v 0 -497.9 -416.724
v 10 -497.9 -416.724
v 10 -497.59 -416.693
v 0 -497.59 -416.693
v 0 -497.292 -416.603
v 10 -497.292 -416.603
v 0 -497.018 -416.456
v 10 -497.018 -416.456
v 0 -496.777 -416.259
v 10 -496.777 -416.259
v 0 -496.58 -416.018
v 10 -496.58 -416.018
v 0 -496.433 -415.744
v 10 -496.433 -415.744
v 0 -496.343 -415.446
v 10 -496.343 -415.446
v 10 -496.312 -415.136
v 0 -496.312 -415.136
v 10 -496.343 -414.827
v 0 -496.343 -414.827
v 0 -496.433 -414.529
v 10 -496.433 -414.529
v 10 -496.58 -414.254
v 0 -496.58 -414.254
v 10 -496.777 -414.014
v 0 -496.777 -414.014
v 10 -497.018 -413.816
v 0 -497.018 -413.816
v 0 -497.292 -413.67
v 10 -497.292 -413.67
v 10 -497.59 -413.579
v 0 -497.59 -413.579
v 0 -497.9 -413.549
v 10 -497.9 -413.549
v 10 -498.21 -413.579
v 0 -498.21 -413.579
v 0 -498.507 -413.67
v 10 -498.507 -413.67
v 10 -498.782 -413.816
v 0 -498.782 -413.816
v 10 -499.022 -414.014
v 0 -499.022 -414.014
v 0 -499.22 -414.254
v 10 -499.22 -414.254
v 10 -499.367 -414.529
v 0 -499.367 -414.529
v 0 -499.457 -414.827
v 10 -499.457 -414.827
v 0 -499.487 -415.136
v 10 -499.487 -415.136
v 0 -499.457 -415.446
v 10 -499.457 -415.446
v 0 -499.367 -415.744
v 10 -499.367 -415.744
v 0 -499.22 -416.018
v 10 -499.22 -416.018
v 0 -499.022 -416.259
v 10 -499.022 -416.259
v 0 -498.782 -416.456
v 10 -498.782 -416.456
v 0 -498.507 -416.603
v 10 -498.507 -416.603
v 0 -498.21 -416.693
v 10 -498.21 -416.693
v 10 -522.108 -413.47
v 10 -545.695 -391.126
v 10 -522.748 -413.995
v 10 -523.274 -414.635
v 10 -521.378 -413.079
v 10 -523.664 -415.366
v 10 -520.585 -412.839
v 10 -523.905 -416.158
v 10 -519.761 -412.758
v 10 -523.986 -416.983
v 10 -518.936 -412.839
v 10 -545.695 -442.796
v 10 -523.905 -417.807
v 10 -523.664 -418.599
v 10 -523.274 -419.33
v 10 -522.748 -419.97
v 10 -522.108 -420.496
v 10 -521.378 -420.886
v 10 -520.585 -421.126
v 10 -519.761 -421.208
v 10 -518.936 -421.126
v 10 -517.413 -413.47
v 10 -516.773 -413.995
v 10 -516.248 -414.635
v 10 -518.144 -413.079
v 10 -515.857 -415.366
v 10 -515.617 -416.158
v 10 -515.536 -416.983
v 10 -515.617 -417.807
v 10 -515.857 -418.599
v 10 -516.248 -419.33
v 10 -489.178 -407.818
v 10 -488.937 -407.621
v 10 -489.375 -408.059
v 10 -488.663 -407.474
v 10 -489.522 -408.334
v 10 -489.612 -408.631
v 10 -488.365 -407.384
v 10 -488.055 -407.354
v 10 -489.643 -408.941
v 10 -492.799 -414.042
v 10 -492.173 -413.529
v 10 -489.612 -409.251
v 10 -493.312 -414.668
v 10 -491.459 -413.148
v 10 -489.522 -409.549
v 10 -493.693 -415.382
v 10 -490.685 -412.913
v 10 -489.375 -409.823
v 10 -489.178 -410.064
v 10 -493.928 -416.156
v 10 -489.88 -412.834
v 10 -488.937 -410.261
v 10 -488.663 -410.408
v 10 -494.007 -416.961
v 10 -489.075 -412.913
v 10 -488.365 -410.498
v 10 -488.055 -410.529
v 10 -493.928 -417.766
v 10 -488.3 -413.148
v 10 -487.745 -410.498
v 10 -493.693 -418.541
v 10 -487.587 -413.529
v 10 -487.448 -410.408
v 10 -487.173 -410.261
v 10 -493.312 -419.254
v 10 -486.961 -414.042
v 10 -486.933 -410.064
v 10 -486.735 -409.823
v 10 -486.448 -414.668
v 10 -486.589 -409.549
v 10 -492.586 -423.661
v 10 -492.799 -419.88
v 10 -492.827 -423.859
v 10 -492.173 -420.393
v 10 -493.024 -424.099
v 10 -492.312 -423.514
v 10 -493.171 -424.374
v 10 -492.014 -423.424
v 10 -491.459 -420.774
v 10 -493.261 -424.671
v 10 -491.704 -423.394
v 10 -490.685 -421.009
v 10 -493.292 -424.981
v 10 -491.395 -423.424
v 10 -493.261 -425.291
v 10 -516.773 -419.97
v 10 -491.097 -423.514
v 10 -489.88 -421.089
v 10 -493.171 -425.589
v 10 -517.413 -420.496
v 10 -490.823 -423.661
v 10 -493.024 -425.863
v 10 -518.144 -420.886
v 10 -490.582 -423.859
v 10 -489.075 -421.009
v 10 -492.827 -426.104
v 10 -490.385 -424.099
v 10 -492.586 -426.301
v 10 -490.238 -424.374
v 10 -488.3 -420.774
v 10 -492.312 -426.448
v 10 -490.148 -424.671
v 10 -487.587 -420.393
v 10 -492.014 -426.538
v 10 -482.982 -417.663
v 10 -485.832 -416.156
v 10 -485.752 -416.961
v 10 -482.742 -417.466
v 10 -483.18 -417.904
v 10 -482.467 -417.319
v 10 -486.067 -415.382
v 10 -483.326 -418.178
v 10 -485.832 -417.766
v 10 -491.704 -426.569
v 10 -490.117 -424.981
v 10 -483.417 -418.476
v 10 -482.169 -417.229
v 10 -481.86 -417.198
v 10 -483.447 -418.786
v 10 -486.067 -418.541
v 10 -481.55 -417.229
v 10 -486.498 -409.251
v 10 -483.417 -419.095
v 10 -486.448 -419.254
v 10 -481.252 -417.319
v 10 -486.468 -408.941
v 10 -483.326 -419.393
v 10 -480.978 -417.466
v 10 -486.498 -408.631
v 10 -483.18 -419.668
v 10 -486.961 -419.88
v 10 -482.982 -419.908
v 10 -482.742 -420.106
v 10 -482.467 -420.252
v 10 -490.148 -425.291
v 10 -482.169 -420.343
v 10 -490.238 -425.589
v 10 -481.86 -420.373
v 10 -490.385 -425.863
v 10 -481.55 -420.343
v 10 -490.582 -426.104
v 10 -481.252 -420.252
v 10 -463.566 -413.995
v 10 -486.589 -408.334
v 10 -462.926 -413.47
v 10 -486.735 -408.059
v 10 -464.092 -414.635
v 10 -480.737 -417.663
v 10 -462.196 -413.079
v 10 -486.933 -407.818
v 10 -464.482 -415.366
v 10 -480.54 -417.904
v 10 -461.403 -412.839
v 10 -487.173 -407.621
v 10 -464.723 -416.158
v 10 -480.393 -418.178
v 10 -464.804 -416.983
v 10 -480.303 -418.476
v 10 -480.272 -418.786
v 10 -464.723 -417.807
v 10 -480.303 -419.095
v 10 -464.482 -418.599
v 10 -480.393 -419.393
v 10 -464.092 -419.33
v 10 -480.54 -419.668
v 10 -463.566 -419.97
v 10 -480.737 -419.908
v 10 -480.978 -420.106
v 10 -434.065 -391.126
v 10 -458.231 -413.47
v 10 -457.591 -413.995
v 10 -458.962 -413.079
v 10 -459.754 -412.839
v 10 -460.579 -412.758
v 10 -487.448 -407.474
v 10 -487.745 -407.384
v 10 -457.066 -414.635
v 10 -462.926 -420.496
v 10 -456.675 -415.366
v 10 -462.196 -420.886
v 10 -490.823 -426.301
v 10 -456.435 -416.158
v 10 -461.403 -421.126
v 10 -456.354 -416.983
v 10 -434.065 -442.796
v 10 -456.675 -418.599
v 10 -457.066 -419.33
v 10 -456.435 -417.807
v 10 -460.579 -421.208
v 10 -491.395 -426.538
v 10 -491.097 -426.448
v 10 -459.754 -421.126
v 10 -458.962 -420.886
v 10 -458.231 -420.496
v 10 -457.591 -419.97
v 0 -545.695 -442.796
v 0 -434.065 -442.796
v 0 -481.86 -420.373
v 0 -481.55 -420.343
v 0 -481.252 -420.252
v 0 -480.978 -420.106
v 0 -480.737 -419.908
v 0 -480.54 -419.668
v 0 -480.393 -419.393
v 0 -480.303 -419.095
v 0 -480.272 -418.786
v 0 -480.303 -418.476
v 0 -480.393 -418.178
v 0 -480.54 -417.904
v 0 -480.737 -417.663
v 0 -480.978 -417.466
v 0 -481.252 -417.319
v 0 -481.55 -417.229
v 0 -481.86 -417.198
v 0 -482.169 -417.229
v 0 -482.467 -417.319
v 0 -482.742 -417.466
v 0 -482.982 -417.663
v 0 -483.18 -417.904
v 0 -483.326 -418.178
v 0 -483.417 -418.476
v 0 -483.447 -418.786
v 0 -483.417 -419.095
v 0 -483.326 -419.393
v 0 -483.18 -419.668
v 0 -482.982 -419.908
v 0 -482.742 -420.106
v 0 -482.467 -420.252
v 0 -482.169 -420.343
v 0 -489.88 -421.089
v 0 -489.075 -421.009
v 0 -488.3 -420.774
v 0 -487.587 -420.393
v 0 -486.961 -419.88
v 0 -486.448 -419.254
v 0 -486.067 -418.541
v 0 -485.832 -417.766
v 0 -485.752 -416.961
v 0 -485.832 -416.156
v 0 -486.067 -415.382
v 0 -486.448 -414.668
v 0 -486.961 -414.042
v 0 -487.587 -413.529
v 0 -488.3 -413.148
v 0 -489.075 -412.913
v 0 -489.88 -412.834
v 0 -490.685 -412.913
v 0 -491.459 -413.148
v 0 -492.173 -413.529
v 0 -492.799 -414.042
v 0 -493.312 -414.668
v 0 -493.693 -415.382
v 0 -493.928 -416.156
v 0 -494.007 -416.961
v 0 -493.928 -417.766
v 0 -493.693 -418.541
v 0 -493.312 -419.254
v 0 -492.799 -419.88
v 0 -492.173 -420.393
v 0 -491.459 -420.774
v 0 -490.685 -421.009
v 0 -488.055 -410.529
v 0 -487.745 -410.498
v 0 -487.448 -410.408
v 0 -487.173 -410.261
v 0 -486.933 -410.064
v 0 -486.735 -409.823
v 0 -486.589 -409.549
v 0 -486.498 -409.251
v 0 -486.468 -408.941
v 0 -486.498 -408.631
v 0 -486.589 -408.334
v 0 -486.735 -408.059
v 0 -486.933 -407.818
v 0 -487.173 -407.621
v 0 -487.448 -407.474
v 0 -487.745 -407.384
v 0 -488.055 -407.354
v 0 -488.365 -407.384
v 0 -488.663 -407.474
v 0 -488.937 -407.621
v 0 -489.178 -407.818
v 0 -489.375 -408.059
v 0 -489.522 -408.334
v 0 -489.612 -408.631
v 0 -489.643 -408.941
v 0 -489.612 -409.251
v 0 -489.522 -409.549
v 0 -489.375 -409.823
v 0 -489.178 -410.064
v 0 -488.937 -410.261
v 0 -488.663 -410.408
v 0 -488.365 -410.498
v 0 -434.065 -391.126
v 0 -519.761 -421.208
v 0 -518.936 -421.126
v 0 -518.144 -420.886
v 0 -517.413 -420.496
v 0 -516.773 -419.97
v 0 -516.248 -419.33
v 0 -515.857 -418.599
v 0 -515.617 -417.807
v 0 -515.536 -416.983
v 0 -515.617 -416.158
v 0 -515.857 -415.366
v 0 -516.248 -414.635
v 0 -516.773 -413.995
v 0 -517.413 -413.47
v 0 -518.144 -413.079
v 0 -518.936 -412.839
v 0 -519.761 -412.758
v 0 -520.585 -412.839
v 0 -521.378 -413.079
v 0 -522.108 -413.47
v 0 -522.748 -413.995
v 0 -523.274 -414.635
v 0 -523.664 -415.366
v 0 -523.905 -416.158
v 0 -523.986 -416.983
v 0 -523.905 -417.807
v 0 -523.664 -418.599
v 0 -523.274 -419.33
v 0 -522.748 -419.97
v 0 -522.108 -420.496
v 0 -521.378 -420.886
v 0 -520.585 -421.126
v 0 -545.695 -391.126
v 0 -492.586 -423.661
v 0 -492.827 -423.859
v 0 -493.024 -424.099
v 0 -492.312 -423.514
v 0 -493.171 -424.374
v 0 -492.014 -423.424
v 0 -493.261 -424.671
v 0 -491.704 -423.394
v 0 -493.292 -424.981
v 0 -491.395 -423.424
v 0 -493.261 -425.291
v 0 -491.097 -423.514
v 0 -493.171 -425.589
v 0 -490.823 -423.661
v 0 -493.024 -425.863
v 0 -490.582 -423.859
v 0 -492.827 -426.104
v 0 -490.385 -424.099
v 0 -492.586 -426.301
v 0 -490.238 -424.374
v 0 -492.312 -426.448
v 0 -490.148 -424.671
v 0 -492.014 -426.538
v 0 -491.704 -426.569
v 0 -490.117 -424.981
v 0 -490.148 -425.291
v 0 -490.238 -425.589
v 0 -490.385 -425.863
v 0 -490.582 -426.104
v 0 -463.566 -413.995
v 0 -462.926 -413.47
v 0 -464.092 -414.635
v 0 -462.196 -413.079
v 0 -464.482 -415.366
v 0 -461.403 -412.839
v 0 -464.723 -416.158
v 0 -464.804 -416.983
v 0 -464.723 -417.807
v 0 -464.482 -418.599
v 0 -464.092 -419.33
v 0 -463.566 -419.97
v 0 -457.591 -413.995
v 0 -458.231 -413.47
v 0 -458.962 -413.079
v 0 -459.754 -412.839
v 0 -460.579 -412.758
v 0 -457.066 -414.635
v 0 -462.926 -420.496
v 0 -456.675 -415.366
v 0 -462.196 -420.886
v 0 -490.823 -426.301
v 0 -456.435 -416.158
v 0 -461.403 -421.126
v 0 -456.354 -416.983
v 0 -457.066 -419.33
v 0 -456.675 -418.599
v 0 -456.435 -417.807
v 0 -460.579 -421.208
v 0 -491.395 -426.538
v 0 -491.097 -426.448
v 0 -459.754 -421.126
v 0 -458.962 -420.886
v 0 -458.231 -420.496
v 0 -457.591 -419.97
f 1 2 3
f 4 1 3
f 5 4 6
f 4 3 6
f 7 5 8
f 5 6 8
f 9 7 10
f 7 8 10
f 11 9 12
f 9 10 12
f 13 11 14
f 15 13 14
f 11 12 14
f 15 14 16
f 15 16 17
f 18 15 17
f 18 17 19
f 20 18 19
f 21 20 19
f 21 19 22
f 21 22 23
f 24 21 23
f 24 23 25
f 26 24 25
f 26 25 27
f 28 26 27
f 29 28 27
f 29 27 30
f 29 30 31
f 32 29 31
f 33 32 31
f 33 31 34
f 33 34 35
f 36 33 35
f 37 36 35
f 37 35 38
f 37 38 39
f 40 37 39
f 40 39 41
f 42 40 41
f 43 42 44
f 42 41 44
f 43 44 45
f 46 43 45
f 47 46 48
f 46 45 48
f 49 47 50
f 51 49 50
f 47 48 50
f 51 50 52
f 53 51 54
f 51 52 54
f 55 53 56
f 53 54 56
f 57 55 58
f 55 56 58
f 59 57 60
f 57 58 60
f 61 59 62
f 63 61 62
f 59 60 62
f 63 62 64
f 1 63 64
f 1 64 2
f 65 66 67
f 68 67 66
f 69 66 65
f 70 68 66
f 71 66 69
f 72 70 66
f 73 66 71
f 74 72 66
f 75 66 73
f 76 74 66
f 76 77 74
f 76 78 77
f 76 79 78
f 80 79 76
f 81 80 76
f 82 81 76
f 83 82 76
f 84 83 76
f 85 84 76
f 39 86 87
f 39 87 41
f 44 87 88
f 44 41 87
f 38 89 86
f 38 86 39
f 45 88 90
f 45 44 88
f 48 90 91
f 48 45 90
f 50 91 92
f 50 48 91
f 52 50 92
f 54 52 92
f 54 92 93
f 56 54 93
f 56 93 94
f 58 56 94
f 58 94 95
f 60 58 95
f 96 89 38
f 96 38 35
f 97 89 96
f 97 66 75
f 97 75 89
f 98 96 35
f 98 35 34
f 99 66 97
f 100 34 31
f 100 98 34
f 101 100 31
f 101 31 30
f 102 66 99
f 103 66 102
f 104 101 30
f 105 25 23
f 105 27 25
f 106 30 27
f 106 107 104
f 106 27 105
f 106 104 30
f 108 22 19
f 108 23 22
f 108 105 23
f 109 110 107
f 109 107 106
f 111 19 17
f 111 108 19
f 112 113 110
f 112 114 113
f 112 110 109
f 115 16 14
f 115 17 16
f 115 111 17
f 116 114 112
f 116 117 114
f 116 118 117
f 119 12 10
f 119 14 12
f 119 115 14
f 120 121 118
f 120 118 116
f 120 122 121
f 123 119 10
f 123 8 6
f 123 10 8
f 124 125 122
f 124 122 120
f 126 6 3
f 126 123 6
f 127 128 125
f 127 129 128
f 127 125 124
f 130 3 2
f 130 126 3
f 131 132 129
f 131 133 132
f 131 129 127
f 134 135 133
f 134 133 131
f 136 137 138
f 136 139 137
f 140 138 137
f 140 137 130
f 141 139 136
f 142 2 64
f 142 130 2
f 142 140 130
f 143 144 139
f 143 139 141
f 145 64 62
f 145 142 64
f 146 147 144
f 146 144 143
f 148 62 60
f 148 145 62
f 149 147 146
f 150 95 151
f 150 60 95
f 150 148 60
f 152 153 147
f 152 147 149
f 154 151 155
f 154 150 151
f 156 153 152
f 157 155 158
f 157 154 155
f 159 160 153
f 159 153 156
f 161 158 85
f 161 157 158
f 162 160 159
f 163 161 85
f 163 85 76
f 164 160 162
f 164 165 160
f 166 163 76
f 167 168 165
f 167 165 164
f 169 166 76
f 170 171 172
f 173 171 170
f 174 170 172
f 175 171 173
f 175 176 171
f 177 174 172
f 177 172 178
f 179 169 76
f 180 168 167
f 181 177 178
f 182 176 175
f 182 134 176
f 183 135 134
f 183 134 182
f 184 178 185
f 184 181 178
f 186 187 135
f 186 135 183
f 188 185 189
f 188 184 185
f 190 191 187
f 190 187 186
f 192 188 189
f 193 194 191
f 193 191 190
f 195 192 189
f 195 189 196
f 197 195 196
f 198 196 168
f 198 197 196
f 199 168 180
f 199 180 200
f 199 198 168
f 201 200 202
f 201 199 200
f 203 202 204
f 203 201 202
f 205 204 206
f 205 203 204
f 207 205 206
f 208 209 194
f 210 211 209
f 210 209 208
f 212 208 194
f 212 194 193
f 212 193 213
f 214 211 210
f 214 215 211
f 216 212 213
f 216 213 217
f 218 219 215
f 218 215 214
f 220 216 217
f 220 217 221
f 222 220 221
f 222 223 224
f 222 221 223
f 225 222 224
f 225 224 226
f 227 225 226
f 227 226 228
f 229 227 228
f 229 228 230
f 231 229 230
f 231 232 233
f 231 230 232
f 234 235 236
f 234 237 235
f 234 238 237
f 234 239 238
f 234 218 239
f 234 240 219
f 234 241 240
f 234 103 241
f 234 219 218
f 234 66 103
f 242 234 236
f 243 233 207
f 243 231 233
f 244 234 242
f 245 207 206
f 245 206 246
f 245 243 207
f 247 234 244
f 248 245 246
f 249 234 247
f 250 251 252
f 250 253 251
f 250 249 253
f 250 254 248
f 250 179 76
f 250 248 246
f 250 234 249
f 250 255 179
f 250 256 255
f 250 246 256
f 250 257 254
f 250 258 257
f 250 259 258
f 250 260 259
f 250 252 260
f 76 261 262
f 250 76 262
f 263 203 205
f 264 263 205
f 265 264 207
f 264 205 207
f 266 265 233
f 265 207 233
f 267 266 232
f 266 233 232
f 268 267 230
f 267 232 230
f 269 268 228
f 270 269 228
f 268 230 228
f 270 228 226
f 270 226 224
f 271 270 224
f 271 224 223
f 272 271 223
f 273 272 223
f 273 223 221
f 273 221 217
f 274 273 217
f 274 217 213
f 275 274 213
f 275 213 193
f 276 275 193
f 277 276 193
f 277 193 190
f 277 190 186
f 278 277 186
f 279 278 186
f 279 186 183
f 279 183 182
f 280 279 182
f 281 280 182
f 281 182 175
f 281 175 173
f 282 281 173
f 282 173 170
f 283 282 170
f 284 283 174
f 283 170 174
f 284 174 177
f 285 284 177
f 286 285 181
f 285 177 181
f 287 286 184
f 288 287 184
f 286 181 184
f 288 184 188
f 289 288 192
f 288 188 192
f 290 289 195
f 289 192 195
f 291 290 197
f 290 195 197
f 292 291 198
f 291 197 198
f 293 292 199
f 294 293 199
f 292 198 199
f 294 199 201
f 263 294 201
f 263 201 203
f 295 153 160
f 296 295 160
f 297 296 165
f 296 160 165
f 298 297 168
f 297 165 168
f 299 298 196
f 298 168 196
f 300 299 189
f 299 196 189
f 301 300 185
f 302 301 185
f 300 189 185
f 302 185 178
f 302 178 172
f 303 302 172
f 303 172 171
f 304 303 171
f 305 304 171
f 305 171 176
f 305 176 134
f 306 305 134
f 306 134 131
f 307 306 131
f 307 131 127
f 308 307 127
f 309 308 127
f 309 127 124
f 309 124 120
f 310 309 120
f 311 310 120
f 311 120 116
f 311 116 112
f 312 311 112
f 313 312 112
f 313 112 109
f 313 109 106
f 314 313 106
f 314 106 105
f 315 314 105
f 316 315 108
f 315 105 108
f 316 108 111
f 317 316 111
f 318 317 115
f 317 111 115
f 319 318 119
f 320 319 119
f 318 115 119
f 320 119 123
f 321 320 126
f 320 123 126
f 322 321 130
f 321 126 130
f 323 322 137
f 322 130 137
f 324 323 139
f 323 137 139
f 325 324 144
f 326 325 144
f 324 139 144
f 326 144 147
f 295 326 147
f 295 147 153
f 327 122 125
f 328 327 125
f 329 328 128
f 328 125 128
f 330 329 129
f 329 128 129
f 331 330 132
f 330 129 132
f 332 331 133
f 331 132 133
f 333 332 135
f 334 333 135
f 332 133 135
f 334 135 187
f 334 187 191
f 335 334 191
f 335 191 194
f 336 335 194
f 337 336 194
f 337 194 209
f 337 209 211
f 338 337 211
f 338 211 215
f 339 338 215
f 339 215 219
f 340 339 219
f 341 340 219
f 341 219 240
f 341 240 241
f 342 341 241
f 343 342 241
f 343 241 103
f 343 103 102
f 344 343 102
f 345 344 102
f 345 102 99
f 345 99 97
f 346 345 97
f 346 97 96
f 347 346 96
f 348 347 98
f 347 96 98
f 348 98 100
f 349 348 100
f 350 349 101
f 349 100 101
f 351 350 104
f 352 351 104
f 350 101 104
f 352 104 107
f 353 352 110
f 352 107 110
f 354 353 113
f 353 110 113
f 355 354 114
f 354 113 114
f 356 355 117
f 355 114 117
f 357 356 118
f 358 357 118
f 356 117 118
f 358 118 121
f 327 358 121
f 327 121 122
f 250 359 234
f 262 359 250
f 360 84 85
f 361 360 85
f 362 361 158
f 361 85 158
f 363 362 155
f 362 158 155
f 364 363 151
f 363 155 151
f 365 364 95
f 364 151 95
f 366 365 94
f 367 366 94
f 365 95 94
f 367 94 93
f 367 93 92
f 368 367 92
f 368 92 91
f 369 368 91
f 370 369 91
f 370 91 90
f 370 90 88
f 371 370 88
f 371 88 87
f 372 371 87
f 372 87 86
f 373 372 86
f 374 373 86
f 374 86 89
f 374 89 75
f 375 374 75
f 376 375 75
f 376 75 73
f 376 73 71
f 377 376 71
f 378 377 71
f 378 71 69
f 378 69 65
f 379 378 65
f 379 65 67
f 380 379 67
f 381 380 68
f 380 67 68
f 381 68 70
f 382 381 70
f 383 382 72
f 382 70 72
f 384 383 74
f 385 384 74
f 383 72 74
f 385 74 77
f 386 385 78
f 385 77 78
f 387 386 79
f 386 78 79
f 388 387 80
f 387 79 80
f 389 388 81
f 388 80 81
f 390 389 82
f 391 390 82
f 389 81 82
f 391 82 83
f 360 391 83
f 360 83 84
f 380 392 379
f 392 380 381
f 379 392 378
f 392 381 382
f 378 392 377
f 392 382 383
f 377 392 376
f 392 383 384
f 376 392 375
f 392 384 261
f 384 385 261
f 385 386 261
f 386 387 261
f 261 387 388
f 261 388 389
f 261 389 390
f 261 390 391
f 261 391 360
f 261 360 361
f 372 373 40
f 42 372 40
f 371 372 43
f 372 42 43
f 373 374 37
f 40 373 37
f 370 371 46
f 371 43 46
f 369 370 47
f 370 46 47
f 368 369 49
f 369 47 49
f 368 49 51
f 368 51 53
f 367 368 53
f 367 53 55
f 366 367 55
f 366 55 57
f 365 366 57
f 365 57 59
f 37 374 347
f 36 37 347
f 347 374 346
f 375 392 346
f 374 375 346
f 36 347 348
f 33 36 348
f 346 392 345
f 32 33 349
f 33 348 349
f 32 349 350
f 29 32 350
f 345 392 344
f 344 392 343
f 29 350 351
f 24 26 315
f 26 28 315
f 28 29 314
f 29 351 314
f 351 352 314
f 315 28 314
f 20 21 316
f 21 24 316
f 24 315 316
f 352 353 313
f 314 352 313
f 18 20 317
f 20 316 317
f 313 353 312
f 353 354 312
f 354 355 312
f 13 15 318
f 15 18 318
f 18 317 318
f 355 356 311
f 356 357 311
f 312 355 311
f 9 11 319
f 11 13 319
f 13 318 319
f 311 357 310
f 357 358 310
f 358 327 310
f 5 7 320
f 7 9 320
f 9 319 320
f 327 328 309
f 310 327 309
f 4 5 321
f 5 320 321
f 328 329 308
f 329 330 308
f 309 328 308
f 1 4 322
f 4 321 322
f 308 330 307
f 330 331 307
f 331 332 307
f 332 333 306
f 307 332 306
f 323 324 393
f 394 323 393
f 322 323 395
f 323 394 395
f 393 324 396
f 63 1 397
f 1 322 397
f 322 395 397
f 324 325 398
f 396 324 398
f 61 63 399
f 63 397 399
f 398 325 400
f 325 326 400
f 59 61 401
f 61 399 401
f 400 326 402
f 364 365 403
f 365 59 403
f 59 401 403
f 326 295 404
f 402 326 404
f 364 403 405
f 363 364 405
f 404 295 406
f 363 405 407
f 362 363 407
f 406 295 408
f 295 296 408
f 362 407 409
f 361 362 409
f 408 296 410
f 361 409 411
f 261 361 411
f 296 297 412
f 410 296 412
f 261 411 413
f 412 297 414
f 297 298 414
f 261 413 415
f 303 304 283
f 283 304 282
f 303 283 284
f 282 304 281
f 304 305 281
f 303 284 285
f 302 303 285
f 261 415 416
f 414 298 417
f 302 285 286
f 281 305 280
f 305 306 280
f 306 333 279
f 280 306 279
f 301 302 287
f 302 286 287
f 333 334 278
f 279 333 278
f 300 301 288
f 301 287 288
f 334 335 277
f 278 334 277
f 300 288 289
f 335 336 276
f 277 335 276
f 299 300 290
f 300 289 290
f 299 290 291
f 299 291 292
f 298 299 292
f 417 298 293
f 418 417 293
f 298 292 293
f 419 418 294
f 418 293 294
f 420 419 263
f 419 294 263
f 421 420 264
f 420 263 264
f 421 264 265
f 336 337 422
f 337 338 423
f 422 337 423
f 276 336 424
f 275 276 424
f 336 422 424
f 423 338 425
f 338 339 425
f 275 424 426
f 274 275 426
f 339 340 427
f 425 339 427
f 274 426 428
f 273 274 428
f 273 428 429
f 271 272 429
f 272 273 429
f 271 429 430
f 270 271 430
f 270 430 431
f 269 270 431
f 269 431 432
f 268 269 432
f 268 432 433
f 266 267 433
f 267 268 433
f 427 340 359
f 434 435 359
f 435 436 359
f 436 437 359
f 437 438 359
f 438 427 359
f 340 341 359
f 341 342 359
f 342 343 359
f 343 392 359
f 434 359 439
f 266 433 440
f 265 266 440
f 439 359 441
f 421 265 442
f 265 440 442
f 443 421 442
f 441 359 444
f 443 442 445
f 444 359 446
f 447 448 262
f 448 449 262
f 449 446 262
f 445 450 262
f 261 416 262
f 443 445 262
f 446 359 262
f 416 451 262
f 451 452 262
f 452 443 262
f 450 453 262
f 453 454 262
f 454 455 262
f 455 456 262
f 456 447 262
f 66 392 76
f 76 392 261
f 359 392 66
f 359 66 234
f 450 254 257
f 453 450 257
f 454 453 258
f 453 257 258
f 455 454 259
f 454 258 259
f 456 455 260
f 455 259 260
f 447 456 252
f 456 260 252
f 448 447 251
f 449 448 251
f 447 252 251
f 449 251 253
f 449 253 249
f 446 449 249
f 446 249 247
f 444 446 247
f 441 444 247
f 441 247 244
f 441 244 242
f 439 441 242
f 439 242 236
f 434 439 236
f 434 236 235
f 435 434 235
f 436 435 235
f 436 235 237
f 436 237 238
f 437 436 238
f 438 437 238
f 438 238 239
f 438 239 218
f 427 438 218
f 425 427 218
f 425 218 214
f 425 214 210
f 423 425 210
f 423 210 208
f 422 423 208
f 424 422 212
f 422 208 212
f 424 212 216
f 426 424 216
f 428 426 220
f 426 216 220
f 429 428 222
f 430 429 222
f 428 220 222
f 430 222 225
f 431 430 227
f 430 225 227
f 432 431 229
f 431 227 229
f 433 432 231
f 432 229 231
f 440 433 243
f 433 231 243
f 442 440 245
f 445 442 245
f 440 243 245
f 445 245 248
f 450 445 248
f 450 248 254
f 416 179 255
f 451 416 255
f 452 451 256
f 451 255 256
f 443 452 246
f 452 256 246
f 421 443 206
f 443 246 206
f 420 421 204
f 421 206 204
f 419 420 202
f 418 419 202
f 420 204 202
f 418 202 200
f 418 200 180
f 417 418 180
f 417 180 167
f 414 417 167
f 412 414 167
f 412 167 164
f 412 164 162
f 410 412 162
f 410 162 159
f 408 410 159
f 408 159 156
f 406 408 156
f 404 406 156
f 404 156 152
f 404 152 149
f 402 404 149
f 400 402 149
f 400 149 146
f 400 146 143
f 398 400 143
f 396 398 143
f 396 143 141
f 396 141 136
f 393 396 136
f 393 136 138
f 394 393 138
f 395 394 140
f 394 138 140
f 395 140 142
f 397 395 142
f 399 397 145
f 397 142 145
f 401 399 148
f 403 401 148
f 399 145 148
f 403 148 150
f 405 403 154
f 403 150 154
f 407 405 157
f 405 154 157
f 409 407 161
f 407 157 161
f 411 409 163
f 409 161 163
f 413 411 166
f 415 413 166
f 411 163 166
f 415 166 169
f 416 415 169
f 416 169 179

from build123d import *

# Parameters (mm, degrees)
SKETCH2_W           = 51.670795736
SKETCH2_H           = 111.629965862
BOSS_EXTRUDE1_DEPTH = 10
SKETCH3_R           = 4.225
SKETCH3_R_2         = 4.1275
CUT_EXTRUDE1_DEPTH  = 11
SKETCH5_R           = 1.5875
CUT_EXTRUDE2_DEPTH  = 11


with BuildPart() as part:
    # Sketch2 → Boss-Extrude1 (new body)
    with BuildSketch(Plane(origin=(0, 0, 0), x_dir=(0, 0, -1), z_dir=(1, 0, 0))):
        with Locations((416.961058265, -489.879931508)):
            Rectangle(SKETCH2_W, SKETCH2_H)
    extrude(amount=BOSS_EXTRUDE1_DEPTH)

    # Sketch3 → Cut-Extrude1 (cut, through all)
    with BuildSketch(Plane(origin=(10, 0, 0), x_dir=(0, 0, -1), z_dir=(1, 0, 0))):
        with Locations((416.982623845, -460.578730032)):
            Circle(SKETCH3_R)
        with Locations((416.982623845, -519.760730032)):
            Circle(SKETCH3_R)
        with Locations((416.961058265, -489.879931508)):
            Circle(SKETCH3_R_2)
    extrude(amount=-CUT_EXTRUDE1_DEPTH, mode=Mode.SUBTRACT)

    # Sketch5 → Cut-Extrude2 (cut, through all)
    with BuildSketch(Plane(origin=(10, 0, 0), x_dir=(0, 0, -1), z_dir=(1, 0, 0))):
        with Locations((418.78573561, -481.859784241)):
            Circle(SKETCH5_R)
        with Locations((424.981126269, -491.704497776)):
            Circle(SKETCH5_R)
        with Locations((415.136412734, -497.899888435)):
            Circle(SKETCH5_R)
        with Locations((408.941022075, -488.0551749)):
            Circle(SKETCH5_R)
    extrude(amount=-CUT_EXTRUDE2_DEPTH, mode=Mode.SUBTRACT)


solid = part.part
